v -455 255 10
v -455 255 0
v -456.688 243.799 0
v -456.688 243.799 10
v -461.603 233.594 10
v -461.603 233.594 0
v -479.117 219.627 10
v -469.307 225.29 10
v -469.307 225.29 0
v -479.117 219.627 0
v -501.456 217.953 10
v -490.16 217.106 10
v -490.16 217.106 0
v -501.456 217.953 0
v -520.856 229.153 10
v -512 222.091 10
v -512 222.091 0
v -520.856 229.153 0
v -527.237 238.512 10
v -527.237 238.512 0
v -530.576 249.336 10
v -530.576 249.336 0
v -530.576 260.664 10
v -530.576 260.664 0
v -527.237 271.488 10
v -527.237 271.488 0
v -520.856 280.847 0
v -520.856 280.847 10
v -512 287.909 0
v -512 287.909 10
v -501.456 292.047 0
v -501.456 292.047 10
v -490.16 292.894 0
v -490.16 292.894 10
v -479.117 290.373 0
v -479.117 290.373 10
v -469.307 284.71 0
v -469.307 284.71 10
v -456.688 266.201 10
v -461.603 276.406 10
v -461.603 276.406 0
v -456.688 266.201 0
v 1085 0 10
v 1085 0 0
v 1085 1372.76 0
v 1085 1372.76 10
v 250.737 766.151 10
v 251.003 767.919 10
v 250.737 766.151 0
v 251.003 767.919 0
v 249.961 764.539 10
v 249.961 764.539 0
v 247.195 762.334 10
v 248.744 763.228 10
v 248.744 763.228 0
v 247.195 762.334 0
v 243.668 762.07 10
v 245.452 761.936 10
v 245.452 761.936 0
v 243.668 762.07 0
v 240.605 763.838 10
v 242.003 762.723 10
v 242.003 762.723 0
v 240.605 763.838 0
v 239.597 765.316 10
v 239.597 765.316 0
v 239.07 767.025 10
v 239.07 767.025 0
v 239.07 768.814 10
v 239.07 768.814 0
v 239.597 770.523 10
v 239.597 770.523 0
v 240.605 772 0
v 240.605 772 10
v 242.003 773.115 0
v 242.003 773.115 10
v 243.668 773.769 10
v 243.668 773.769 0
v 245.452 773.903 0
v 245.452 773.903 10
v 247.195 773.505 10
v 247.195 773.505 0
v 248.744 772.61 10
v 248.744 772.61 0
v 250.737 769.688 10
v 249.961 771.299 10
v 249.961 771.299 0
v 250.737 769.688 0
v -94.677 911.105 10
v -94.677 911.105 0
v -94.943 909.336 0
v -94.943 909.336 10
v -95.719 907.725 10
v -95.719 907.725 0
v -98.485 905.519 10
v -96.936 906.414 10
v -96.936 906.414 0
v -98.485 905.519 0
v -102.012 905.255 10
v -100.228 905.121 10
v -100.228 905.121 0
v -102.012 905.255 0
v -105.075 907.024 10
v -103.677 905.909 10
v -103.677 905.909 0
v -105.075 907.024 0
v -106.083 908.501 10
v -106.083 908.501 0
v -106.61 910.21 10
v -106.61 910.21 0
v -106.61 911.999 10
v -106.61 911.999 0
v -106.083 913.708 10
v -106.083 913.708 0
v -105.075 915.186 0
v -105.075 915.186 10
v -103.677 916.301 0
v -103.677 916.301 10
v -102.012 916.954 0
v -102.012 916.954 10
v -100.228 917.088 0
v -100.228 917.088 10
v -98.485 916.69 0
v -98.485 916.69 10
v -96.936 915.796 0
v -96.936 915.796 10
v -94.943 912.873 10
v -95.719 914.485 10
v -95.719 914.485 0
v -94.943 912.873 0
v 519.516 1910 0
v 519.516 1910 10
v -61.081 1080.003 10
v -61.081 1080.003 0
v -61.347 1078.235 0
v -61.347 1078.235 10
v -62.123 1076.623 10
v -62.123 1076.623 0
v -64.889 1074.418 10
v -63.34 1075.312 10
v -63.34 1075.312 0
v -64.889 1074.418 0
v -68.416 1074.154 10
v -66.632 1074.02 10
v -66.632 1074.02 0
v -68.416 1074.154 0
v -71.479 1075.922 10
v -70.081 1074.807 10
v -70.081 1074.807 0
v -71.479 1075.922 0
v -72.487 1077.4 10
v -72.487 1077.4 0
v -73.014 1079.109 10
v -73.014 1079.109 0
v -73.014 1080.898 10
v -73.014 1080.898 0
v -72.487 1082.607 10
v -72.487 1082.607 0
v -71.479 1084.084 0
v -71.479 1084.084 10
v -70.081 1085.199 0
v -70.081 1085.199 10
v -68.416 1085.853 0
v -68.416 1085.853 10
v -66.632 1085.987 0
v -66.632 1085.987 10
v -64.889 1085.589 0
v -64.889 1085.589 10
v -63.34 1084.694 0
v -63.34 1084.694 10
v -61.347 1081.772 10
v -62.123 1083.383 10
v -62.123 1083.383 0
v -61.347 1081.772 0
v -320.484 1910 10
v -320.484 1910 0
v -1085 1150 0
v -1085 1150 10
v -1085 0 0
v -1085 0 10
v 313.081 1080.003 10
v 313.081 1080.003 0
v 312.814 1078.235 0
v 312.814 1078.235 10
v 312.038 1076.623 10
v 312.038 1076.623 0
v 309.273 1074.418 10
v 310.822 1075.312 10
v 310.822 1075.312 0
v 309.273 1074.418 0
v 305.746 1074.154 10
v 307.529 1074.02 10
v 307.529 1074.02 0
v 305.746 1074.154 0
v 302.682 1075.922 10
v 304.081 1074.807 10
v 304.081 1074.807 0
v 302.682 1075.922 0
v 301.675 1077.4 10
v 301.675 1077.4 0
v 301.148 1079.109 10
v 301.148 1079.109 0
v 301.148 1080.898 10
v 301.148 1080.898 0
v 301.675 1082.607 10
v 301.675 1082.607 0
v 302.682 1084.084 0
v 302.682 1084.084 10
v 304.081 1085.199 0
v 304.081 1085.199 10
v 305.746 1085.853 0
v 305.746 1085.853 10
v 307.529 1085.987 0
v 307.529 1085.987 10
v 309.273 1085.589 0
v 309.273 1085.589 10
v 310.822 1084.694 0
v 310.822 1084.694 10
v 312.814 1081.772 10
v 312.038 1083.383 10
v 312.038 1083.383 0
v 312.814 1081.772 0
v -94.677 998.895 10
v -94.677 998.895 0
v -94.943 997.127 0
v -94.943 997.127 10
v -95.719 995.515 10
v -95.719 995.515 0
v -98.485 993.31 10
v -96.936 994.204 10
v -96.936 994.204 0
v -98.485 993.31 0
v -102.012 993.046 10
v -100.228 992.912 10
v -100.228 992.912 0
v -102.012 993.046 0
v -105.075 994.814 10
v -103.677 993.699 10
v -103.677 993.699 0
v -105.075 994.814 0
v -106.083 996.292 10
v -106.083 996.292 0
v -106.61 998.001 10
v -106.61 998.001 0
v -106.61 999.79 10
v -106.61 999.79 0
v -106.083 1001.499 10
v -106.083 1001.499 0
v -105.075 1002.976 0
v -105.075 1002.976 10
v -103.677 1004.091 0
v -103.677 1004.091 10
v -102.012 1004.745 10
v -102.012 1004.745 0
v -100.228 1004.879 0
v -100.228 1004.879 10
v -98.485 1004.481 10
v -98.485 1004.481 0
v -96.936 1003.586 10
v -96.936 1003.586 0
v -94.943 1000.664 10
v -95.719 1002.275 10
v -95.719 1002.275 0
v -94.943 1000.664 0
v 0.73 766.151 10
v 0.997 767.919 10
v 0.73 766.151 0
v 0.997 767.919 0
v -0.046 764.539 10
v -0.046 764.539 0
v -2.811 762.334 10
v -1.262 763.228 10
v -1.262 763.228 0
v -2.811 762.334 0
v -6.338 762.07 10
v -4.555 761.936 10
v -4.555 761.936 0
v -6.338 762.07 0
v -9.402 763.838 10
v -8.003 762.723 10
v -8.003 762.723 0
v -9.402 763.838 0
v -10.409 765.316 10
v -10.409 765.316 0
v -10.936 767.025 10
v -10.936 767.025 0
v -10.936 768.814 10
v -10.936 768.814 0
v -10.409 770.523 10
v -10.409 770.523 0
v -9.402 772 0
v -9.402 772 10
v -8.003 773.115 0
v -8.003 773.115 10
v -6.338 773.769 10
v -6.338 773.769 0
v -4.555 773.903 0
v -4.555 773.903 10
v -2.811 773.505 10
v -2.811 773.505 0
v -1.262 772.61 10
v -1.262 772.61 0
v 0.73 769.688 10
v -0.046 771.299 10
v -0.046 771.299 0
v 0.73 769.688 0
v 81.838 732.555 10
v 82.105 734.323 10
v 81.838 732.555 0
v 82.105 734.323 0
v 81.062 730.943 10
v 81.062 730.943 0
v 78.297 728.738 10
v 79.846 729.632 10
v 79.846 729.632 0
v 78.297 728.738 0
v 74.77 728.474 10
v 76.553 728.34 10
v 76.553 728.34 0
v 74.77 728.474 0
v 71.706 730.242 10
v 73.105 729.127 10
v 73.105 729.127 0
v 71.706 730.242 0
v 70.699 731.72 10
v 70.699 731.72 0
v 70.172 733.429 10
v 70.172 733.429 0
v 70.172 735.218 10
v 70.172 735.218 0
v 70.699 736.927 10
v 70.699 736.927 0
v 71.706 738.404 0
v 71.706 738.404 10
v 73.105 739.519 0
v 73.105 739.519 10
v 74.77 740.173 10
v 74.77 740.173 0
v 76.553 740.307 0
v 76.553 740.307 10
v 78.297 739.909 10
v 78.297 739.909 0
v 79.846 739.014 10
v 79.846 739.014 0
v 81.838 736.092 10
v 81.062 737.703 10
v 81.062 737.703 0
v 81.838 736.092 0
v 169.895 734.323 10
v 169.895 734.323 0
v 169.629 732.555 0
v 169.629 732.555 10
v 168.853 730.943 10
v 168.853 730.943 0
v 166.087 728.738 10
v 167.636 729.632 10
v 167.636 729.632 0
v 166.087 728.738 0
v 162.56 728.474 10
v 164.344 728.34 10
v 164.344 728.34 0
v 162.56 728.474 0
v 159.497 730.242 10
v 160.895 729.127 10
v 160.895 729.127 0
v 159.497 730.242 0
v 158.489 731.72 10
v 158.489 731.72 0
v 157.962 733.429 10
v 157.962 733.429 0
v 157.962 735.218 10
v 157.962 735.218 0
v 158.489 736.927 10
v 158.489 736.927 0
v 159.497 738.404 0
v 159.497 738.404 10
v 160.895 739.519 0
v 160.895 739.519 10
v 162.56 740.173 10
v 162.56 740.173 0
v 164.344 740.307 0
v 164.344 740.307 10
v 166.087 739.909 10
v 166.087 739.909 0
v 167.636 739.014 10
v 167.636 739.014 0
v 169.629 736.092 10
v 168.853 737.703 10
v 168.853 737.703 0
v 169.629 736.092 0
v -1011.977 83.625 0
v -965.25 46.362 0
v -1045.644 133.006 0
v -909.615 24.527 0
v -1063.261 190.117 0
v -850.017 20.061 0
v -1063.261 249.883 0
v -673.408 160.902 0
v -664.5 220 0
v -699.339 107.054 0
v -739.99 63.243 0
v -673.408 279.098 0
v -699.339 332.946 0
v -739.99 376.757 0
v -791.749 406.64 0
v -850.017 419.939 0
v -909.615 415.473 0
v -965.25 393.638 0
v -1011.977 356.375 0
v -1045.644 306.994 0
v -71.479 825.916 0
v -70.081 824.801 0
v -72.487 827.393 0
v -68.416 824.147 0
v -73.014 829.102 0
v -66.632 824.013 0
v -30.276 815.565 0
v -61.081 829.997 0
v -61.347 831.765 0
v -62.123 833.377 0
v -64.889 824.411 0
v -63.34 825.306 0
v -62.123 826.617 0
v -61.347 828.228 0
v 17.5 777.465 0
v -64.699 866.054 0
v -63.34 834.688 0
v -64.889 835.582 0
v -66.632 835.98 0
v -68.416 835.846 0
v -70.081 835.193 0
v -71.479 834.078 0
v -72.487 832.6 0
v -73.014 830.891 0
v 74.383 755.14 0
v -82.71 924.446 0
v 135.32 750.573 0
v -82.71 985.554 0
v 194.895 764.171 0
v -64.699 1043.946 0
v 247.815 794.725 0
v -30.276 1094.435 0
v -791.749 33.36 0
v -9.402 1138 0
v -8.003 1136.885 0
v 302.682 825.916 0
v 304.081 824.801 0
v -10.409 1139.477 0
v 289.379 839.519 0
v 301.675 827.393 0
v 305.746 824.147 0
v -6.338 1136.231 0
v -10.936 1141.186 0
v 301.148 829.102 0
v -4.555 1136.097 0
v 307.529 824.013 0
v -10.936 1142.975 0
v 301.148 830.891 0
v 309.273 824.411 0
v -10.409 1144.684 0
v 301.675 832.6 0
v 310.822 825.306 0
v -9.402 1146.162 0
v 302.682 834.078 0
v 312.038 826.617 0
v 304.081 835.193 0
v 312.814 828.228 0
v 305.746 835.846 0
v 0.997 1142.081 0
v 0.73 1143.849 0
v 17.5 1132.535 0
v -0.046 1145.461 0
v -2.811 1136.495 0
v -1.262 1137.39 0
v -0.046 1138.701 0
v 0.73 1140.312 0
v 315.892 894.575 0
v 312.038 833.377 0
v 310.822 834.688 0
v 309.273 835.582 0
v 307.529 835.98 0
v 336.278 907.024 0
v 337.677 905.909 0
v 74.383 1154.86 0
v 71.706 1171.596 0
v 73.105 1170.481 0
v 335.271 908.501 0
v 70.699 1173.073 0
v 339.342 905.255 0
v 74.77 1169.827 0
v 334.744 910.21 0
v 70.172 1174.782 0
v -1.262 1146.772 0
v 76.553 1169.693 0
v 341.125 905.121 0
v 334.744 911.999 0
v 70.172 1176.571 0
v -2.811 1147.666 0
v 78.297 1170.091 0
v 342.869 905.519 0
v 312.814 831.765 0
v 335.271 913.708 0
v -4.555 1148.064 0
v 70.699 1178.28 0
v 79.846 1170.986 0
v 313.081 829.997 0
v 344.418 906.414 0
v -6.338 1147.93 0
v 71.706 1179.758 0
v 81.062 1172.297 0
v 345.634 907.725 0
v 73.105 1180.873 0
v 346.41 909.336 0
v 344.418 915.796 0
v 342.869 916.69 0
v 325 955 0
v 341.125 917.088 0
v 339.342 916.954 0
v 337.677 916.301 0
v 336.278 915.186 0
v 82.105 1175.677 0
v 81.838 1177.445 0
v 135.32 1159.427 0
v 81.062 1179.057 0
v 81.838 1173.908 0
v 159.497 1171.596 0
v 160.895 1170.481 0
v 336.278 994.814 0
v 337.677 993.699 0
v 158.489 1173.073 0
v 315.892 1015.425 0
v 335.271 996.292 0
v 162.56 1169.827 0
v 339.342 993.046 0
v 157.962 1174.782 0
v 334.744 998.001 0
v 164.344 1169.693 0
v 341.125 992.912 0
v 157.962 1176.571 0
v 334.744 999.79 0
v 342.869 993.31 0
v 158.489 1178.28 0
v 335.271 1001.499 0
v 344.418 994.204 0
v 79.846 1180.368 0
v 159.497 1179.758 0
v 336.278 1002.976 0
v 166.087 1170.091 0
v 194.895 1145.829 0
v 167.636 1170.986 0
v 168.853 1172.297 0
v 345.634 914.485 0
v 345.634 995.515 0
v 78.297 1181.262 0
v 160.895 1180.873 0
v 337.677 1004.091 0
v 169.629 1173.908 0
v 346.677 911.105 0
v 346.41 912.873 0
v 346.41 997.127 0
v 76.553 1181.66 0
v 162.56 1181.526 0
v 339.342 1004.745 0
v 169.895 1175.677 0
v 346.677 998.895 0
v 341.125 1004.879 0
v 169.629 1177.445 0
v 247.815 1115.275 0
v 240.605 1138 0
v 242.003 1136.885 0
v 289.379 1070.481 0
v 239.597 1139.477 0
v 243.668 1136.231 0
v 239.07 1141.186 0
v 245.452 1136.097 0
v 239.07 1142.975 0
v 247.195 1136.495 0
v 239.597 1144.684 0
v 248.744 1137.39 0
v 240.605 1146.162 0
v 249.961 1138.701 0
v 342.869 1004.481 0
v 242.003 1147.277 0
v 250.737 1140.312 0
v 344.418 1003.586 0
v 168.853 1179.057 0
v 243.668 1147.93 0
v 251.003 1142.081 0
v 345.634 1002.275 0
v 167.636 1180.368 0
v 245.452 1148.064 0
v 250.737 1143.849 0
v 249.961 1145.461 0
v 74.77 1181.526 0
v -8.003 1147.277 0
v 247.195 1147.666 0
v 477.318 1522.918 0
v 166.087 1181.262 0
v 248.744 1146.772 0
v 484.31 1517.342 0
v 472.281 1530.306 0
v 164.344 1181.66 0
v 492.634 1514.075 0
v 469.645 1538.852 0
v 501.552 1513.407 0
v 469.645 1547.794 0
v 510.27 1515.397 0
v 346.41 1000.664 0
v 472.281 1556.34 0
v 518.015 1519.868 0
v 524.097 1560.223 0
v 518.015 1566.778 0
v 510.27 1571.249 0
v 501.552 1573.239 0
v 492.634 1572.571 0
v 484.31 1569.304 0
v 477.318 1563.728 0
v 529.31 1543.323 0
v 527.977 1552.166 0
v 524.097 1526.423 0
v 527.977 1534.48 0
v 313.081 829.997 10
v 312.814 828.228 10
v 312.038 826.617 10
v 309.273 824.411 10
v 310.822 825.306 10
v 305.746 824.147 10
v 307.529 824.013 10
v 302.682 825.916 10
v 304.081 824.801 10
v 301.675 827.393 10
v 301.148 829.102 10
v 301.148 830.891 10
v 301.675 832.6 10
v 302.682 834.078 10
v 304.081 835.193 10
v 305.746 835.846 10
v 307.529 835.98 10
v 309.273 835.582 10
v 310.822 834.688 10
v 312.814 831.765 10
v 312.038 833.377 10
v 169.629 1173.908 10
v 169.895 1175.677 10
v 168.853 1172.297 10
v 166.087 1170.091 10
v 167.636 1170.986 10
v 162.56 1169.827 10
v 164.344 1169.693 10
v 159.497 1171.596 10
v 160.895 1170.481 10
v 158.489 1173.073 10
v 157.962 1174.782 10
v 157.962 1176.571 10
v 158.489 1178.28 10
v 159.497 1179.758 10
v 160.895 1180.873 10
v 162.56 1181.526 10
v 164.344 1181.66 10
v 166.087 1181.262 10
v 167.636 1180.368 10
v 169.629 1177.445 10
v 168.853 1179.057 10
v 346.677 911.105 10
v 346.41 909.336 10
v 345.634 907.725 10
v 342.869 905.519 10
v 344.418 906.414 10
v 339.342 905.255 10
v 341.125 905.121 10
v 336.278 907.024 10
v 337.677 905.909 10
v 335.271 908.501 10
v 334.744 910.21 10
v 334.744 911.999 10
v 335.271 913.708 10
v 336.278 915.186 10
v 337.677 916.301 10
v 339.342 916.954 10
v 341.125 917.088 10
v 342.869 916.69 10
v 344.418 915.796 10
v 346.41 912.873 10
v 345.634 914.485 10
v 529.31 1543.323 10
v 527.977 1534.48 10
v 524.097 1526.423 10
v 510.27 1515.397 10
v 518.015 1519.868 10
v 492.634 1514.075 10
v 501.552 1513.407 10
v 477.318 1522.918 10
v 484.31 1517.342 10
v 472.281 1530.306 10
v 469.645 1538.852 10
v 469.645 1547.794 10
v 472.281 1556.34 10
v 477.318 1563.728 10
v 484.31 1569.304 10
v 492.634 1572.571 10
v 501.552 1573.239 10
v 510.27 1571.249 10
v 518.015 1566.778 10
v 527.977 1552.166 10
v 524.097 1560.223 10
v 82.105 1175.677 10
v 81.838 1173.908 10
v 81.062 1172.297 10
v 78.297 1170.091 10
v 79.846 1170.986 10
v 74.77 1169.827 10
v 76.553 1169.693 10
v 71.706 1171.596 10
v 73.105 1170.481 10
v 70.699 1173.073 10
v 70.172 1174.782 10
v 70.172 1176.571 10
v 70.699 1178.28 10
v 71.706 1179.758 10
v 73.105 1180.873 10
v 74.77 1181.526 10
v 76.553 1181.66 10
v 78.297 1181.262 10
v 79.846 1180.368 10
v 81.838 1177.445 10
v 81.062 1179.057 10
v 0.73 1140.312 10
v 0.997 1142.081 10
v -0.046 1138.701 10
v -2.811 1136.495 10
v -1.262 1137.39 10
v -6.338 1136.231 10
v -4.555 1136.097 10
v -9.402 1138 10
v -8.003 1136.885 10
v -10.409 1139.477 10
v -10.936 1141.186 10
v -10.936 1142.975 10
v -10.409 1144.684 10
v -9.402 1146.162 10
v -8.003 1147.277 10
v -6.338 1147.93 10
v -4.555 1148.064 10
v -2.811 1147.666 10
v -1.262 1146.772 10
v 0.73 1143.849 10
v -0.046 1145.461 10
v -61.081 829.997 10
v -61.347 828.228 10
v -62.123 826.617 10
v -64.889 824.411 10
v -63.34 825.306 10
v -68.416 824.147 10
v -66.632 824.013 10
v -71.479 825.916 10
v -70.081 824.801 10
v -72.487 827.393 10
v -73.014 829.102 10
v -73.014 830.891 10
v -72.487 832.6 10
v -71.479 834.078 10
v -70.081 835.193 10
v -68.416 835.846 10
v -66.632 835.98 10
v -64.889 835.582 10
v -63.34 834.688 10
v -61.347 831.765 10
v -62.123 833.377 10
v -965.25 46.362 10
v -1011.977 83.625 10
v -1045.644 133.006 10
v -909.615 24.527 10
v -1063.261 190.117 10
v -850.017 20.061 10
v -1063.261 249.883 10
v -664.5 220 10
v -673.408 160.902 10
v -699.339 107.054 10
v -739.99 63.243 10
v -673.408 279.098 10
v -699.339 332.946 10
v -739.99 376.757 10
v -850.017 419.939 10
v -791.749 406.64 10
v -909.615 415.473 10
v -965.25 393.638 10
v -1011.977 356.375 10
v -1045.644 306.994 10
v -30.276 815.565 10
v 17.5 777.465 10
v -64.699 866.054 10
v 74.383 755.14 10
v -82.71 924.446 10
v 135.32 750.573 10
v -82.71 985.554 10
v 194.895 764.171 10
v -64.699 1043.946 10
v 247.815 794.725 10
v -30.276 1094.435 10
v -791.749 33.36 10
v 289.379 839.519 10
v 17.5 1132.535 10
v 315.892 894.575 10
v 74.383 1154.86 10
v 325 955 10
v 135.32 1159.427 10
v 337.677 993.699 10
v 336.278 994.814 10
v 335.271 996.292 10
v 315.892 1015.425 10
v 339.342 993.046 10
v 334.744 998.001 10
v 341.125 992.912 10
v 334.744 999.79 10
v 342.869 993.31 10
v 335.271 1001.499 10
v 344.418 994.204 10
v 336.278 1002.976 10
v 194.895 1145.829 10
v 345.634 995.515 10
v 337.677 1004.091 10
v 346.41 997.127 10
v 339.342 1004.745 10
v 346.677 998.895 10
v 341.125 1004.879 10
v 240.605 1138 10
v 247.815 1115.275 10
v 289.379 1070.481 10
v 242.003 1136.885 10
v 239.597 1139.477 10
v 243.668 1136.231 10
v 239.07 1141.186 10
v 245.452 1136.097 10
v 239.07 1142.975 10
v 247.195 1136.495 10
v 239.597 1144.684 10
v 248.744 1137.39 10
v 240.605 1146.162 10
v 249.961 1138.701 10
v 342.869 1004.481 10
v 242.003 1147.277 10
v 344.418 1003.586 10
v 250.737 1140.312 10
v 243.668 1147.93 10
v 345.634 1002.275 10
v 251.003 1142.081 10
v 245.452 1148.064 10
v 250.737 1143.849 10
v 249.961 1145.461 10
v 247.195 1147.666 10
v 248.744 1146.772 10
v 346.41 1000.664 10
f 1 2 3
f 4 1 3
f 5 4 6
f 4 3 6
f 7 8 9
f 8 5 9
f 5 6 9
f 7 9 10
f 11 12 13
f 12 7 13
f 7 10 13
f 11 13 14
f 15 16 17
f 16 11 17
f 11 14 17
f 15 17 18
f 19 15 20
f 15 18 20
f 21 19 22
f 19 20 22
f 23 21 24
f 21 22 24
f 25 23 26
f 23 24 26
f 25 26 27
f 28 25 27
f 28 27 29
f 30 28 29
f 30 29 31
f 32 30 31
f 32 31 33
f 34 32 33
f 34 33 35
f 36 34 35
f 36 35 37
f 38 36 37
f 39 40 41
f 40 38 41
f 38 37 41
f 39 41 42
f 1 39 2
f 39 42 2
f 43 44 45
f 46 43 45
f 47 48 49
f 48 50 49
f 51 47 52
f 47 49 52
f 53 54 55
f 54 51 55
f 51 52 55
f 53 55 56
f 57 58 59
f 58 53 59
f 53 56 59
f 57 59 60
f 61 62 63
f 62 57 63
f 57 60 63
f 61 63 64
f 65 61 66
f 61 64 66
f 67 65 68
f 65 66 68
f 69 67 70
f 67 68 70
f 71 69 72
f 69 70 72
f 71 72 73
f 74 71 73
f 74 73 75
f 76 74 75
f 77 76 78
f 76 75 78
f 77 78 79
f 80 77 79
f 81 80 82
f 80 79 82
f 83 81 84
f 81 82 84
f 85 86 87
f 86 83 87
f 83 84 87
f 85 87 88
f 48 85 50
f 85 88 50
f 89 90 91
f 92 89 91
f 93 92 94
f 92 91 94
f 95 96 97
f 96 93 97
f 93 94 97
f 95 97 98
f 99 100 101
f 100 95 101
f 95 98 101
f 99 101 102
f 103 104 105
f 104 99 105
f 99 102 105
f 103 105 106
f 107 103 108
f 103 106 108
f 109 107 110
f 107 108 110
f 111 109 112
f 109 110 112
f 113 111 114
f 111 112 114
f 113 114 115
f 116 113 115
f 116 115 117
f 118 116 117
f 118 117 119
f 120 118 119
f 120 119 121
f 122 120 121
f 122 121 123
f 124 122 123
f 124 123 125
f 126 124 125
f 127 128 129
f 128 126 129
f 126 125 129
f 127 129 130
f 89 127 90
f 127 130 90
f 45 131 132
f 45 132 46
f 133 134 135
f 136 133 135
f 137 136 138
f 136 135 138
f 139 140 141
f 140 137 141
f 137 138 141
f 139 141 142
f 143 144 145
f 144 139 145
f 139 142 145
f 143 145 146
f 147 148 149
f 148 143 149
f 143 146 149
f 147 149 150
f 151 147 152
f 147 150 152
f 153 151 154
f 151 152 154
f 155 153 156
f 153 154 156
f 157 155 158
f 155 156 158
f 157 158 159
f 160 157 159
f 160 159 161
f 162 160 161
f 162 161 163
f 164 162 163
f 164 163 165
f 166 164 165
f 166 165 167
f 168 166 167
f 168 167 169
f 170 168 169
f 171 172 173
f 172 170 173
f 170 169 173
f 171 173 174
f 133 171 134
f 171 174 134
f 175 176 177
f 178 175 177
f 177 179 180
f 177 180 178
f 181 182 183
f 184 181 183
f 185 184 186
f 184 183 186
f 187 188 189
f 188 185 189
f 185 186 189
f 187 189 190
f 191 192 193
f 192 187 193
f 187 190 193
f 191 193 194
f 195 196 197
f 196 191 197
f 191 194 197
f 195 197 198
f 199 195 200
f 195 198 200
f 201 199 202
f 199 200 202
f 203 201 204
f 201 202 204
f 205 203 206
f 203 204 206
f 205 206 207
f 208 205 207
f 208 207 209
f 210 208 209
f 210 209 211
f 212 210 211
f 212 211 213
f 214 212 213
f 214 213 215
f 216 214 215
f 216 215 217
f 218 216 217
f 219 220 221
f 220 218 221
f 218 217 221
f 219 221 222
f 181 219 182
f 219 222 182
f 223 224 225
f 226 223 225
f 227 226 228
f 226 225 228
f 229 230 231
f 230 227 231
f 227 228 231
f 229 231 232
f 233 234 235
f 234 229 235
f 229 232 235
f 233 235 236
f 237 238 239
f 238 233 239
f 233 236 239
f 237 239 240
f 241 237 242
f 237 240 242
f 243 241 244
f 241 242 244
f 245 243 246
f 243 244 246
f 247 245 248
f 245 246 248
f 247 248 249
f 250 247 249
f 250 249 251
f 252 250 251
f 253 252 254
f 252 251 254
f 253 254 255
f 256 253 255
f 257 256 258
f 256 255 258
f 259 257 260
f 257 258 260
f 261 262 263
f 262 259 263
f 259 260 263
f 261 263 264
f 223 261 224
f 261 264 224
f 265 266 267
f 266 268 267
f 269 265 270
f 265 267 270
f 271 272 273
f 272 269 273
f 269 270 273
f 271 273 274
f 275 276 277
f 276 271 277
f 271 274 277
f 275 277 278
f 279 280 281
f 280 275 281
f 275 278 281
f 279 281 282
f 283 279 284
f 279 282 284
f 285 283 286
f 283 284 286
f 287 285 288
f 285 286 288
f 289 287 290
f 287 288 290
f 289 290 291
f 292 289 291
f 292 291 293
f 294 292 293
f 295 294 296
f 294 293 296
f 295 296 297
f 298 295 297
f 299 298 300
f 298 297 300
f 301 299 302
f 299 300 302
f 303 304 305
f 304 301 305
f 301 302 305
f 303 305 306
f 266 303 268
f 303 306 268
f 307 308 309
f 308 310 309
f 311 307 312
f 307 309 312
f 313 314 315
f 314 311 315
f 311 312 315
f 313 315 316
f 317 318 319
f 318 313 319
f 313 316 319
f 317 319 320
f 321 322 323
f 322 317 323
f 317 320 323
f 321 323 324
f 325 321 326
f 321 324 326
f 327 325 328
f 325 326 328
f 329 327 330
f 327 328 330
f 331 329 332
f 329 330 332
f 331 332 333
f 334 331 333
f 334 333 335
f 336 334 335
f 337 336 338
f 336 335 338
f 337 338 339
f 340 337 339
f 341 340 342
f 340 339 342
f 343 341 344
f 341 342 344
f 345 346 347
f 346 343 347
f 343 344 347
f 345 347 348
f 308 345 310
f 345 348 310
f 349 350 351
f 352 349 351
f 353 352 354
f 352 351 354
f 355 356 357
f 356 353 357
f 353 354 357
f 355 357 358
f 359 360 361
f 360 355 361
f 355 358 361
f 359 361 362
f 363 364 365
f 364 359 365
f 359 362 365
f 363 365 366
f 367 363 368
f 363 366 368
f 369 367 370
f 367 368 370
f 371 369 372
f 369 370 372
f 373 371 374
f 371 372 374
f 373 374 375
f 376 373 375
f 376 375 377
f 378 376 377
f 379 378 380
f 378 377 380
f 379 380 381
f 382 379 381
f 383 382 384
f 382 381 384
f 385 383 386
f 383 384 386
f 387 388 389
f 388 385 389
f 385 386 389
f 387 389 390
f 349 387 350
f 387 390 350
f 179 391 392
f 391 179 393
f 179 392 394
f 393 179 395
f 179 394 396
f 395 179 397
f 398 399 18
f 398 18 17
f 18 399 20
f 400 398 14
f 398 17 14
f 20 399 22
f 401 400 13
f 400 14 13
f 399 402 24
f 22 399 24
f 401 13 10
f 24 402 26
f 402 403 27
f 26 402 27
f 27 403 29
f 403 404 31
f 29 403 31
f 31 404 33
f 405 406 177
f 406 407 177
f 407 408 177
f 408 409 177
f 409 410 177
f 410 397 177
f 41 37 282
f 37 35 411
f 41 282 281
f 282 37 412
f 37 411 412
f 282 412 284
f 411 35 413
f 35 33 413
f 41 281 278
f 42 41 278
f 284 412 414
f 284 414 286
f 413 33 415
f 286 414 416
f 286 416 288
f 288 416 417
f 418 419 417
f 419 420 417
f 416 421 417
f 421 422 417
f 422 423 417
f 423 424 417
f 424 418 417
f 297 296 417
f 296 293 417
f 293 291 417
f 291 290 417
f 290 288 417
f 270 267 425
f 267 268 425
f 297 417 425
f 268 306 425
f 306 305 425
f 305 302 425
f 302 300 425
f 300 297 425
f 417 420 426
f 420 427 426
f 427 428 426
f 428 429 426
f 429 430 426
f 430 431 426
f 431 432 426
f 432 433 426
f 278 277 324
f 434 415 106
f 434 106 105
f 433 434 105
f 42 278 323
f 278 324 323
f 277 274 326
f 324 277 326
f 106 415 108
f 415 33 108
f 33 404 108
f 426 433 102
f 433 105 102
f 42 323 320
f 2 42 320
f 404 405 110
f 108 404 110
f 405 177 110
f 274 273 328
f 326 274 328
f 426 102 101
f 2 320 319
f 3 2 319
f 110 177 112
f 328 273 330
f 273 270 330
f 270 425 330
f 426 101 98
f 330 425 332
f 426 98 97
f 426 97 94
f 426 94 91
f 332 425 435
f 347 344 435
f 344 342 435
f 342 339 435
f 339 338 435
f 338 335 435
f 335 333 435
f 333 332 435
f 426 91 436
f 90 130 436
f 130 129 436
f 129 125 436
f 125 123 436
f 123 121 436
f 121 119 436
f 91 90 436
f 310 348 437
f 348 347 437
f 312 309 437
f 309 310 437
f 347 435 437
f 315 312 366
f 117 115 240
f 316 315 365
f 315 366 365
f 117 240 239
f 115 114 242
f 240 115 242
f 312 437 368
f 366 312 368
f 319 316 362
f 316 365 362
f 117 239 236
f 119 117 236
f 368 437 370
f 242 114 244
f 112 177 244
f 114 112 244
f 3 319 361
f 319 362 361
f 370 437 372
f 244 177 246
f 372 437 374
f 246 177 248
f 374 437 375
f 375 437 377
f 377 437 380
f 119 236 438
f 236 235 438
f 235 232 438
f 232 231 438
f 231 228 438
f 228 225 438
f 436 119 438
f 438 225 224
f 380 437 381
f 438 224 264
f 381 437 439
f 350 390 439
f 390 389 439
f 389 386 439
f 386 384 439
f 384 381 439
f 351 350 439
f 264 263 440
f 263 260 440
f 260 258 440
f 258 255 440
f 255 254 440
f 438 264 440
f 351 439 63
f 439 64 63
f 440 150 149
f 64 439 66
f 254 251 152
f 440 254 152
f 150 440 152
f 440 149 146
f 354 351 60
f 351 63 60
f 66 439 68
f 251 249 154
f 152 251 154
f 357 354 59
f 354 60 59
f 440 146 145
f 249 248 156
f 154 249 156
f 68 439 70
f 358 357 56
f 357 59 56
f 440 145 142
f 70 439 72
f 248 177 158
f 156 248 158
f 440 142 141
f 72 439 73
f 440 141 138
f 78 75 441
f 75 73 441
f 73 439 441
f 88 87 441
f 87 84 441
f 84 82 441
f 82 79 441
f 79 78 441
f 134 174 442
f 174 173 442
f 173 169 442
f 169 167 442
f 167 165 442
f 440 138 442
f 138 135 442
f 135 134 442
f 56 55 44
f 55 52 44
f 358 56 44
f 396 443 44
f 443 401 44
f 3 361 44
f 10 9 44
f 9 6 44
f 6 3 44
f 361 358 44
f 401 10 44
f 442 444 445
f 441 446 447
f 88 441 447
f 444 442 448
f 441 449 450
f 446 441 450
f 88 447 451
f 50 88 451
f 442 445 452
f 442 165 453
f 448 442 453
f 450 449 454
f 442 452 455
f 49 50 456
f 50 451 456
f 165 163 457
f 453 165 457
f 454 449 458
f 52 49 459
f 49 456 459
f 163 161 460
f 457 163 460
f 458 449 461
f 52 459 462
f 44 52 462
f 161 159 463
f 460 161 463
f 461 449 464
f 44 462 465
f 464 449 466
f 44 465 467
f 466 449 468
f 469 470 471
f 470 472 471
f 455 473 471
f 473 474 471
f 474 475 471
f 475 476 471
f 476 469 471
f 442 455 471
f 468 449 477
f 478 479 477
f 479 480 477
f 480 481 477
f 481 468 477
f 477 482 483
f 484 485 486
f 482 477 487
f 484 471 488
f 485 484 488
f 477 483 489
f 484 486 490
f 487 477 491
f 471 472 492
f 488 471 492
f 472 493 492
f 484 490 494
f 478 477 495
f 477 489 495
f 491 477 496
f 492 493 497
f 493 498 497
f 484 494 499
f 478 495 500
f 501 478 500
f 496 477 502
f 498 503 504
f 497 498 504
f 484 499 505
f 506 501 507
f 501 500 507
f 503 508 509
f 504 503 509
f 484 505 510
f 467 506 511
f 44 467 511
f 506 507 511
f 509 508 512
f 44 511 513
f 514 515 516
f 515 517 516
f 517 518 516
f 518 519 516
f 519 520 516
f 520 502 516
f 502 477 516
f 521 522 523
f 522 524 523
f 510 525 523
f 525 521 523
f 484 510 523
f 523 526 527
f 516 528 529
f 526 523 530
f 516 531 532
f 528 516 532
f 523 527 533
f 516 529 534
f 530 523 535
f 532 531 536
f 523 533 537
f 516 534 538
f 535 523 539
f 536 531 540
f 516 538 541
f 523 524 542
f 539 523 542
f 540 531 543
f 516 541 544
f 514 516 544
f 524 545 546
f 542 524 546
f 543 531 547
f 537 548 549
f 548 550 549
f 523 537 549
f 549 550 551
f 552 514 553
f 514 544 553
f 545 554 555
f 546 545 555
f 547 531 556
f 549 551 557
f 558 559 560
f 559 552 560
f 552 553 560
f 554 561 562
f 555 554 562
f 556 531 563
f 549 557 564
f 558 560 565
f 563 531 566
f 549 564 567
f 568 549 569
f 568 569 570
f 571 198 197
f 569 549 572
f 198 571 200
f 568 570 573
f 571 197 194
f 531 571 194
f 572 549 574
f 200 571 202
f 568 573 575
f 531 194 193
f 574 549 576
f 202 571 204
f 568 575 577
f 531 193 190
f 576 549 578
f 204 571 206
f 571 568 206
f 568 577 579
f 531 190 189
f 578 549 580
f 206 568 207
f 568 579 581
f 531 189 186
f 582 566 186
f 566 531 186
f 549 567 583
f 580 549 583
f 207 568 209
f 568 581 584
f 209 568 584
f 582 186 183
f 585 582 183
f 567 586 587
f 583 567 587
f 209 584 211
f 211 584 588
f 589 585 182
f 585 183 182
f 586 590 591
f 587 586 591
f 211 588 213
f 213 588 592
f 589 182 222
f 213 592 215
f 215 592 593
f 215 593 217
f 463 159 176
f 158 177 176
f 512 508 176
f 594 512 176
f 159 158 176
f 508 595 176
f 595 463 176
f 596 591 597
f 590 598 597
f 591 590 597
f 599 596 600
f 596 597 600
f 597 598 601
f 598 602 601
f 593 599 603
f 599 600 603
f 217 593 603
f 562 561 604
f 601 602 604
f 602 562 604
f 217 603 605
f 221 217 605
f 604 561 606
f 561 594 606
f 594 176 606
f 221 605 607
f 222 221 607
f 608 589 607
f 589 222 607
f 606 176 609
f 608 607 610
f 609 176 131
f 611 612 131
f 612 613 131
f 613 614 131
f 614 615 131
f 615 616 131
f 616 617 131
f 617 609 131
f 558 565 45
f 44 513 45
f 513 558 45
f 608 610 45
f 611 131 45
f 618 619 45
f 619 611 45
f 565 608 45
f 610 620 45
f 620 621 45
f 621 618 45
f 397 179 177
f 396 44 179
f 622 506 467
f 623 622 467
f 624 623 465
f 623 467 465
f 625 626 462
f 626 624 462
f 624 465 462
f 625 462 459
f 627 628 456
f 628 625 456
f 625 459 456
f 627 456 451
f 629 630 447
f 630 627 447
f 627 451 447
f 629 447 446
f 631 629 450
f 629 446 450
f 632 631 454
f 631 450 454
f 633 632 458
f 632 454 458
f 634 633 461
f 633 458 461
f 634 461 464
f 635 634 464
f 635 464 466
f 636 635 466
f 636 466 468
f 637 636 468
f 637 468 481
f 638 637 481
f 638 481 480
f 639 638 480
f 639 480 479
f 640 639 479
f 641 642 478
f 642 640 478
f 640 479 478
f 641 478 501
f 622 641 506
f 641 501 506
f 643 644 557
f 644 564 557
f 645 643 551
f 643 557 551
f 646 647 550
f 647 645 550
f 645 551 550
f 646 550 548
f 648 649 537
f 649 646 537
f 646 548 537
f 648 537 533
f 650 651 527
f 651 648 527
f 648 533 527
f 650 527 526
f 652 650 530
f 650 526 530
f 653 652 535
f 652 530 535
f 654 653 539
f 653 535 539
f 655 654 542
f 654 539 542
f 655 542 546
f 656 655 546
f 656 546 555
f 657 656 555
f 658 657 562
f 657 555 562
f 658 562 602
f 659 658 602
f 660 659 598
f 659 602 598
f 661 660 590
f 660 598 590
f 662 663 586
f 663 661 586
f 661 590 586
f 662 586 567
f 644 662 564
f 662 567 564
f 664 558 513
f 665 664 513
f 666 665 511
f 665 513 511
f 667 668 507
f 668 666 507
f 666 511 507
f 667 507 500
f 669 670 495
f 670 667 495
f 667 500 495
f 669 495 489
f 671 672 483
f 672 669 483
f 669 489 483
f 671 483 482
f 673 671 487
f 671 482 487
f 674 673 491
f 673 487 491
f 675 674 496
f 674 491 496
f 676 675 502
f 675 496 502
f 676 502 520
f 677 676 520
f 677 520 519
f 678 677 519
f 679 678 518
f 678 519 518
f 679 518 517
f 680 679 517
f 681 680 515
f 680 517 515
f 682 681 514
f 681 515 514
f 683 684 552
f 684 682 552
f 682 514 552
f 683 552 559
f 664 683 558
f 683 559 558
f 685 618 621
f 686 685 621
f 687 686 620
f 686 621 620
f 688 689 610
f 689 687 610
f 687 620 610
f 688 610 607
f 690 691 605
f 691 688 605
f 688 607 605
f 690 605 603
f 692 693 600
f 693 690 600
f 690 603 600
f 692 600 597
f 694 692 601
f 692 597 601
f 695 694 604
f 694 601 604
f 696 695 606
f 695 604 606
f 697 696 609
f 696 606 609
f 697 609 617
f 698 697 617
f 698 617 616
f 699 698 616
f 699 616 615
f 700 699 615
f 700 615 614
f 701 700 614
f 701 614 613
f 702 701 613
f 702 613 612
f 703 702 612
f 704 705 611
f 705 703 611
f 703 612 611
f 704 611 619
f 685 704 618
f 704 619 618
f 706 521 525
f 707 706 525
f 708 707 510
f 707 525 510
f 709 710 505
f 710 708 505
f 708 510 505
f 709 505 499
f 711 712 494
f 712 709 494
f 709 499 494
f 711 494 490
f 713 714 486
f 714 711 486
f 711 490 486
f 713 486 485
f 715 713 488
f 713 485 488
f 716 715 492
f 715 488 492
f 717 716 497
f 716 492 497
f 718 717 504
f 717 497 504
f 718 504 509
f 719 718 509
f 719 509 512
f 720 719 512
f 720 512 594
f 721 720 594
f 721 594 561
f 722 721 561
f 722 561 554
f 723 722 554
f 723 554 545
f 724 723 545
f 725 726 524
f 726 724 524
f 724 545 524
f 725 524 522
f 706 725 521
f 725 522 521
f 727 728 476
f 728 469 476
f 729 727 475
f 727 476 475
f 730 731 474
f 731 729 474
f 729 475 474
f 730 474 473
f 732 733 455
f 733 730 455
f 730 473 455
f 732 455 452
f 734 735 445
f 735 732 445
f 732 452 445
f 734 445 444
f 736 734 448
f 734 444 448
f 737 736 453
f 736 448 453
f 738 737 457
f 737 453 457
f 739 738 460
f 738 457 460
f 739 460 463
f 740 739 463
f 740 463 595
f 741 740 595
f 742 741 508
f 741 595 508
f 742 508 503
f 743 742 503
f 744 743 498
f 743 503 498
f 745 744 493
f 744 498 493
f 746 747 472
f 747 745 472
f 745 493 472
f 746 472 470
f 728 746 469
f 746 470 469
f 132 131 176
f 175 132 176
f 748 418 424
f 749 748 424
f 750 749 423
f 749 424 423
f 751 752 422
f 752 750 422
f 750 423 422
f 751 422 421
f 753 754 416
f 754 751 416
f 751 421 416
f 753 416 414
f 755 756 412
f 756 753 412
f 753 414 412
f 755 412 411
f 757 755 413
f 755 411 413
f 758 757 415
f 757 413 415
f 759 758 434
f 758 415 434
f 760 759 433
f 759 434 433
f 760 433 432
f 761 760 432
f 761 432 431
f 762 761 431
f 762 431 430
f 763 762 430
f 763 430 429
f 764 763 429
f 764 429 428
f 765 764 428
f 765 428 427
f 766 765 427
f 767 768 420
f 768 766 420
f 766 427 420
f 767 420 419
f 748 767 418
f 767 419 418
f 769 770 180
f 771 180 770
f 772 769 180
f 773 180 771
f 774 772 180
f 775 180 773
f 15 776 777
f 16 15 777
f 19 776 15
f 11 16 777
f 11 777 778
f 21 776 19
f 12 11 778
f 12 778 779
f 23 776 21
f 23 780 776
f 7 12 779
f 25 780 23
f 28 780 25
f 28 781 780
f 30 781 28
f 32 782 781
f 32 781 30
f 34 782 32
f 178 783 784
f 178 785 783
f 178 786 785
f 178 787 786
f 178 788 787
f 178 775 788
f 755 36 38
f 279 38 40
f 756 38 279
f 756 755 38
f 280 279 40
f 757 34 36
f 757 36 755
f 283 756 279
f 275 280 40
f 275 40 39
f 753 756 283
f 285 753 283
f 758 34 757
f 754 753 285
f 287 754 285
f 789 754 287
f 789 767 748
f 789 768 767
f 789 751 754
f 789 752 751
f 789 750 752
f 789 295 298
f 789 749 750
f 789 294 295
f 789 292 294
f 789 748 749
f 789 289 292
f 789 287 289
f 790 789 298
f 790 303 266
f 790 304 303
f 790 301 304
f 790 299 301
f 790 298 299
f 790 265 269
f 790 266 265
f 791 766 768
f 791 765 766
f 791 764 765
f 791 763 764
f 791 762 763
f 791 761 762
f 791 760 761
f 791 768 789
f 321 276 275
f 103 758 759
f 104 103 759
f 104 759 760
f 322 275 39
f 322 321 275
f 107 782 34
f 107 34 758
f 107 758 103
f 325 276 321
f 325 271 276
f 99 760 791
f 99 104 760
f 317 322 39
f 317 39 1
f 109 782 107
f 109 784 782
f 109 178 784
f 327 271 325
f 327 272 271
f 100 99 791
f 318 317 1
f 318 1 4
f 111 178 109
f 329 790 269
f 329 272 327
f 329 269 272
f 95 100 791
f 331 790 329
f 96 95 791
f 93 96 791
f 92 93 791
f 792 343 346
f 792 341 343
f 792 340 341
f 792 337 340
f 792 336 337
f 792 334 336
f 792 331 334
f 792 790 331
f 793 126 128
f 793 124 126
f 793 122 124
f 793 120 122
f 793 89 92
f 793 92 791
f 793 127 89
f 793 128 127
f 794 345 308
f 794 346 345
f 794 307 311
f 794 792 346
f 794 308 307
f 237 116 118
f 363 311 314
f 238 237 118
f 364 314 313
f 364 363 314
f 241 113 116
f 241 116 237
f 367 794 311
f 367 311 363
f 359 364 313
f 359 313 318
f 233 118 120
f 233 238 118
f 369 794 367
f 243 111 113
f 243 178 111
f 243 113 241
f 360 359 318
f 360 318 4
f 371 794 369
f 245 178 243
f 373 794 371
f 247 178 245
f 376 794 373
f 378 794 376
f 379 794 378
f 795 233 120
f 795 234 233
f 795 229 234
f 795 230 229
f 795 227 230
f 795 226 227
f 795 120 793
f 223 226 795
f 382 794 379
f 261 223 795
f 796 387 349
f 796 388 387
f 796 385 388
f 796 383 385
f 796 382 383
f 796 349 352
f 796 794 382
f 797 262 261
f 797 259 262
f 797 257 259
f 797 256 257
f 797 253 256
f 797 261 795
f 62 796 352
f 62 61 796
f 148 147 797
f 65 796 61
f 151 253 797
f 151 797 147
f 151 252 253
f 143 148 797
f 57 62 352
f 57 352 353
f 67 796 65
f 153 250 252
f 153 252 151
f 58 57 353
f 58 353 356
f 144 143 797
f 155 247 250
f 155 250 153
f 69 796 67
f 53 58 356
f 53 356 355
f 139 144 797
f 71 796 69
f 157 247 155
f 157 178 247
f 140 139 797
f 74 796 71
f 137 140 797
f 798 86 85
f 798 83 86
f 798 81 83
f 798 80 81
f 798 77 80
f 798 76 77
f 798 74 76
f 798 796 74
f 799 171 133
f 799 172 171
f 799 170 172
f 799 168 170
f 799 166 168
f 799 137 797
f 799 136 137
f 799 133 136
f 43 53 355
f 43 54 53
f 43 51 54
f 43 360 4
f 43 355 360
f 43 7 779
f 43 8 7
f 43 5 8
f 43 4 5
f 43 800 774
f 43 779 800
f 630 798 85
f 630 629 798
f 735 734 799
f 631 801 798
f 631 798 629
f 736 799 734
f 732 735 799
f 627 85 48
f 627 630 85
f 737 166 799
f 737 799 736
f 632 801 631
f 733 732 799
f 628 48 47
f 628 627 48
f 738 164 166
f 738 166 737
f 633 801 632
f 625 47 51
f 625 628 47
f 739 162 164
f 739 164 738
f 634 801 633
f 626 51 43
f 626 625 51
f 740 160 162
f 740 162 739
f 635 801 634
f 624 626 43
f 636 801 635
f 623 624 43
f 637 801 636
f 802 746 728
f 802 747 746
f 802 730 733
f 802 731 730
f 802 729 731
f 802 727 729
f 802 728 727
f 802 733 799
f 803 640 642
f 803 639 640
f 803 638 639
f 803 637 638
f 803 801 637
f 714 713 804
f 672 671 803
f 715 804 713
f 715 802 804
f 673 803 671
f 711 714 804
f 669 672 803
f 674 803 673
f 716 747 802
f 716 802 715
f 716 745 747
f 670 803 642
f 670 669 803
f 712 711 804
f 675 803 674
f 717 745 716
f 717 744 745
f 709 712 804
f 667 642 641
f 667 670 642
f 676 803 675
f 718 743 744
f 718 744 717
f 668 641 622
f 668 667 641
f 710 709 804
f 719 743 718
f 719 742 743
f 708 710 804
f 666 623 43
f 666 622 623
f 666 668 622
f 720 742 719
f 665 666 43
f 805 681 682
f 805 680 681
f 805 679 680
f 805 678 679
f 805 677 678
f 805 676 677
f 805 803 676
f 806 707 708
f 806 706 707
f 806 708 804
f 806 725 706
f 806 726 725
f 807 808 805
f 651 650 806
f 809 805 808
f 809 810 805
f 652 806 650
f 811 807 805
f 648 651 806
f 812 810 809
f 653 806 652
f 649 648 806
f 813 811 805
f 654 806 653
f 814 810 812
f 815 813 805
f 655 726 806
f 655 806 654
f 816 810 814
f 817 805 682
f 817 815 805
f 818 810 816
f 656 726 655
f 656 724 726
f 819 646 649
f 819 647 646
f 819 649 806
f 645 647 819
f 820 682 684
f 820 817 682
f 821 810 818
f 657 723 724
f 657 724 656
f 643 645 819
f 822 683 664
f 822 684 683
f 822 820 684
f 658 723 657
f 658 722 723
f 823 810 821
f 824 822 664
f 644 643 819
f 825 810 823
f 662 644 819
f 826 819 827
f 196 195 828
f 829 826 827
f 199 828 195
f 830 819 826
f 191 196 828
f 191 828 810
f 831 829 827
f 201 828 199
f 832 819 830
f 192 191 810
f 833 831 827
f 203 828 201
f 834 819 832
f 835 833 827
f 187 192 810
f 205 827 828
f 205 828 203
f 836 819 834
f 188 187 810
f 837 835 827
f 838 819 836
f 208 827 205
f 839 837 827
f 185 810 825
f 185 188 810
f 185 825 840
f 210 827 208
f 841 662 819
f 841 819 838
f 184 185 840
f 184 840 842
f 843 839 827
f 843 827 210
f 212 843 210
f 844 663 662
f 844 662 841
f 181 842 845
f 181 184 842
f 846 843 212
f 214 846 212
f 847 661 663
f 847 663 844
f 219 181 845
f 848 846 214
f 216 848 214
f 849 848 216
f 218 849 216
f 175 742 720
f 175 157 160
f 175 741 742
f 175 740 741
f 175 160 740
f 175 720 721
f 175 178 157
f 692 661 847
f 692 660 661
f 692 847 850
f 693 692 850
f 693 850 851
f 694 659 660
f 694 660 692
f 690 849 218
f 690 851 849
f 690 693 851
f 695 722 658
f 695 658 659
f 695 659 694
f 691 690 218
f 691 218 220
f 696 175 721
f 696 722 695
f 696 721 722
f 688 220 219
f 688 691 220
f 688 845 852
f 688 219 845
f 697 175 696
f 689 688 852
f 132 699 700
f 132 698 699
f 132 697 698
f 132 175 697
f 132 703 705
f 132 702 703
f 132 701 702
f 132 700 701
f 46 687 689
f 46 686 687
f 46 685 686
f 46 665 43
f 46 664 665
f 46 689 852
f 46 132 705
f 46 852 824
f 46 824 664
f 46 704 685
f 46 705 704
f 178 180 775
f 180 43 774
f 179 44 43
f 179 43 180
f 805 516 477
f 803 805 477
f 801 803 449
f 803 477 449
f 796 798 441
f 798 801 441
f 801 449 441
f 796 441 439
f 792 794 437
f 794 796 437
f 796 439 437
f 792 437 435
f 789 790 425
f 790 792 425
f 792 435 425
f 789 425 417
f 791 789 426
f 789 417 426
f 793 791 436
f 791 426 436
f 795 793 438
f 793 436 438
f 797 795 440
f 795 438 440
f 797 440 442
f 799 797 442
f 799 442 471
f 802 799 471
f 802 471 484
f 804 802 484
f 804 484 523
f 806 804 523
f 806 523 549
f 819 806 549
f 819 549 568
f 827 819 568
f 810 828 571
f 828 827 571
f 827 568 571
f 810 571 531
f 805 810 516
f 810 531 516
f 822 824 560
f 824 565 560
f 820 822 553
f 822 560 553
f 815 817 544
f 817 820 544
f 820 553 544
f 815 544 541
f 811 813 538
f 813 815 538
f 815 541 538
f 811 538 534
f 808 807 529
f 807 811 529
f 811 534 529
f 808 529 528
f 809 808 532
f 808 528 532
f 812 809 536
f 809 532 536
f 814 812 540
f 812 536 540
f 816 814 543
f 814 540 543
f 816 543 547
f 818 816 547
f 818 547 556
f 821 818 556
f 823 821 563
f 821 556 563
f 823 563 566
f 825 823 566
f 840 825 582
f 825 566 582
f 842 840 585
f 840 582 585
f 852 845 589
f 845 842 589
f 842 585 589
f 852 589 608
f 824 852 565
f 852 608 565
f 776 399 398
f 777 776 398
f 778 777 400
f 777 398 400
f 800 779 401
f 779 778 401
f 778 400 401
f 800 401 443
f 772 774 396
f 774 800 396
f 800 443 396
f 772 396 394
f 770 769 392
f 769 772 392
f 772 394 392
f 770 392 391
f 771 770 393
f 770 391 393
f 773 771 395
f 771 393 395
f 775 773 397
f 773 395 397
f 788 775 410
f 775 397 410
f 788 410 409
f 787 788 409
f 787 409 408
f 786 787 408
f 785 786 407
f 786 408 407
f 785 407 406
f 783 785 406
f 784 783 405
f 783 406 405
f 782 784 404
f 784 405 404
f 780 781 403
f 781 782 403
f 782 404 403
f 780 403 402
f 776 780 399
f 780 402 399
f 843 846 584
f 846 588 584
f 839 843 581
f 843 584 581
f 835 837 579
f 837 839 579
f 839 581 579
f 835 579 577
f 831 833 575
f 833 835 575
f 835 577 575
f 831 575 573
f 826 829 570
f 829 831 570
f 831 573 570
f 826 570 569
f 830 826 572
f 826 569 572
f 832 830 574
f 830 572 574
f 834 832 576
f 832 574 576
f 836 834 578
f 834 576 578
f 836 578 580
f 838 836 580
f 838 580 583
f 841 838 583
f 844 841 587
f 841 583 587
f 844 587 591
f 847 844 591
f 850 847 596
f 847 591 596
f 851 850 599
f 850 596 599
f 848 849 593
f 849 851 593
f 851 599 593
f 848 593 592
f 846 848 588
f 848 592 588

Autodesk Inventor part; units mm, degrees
ref_plane "YZ Plane" through (0, 0, 0) normal (1, 0, 0) x (0, 1, 0)
ref_plane "XZ Plane" through (0, 0, 0) normal (0, 1, 0) x (-1, 0, 0)
ref_plane "XY Plane" through (0, 0, 0) normal (0, 0, 1) x (1, 0, 0)
sketch "Sketch1" plane through (0, 0, 0) normal (0, 0, 1) x (1, 0, 0)
  line L0 (519.5155, 1910) -> (-320.4845, 1910)
  line L1 (-320.4845, 1910) -> (-1085, 1150)
  line L2 (-1085, 0) -> (-1085, 1150)
  line L3 (1085, 0) -> (1085, 1372.7595)
  line L4 (519.5155, 1910) -> (1085, 1372.7595)
  line L5 (1085, 0) -> (-1085, 0)
  circle A0 centre (-865, 220) radius 200.5
  circle A1 centre (-493, 255) radius 38
  circle A2 centre (120, 955) radius 700 construction
  line L6 (499.31, 1277) -> (499.31, 1910) construction
  circle A3 centre (499.31, 1543.323) radius 30
  line L7 (1085, 955) -> (325, 955) construction
  circle A4 centre (120, 955) radius 205
  line L8 (120, 0) -> (120, 750) construction
  circle A5 centre (120, 955) radius 225 construction
  circle A6 centre (163.8953, 1175.6767) radius 6
  line L9 (120, 955) -> (120, 1180) construction
  line L10 (163.8953, 1175.6767) -> (120, 955) construction
  circle A7 centre (76.1047, 1175.6767) radius 6
  circle A8 centre (-5.0033, 1142.0807) radius 6
  circle A9 centre (-67.0807, 1080.0033) radius 6
  circle A10 centre (-100.6767, 998.8953) radius 6
  circle A11 centre (-100.6767, 911.1047) radius 6
  circle A12 centre (-67.0807, 829.9967) radius 6
  circle A13 centre (-5.0033, 767.9193) radius 6
  circle A14 centre (76.1047, 734.3233) radius 6
  circle A15 centre (163.8953, 734.3233) radius 6
  circle A16 centre (245.0033, 767.9193) radius 6
  circle A17 centre (307.0807, 829.9967) radius 6
  circle A18 centre (340.6767, 911.1047) radius 6
  circle A19 centre (340.6767, 998.8953) radius 6
  circle A20 centre (307.0807, 1080.0033) radius 6
  circle A21 centre (245.0033, 1142.0807) radius 6
  circle A22 centre (120, 955) radius 670 construction
  point P0 (0, 0)
  dimension "d69" = 1400
  dimension "d1" = 840
  dimension "d3" = 1150
  dimension "d14" = 76
  dimension "d15" = 1910
  dimension "d16" = 255
  dimension "d17" = 220
  dimension "d18" = 401
  dimension "d19" = 220
  dimension "d33" = 2170
  dimension "d49" = 372
  dimension "d51" = 780
  dimension "d52" = 1078
  dimension "d70" = 1584.31
  dimension "d71" = 60
  dimension "d74" = 760
  dimension "d75" = 410
  dimension "d76" = 750
  dimension "d77" = 450
  dimension "d78" = 12
  dimension "d79" = 11.25
  dimension "d82" = 360
  dimension "d84" = 465
extrude "Extrusion5" add sketch "Sketch1" along normal blind 10
equation "\"d17\" = d19"
properties part number "Left wall v2.0"
